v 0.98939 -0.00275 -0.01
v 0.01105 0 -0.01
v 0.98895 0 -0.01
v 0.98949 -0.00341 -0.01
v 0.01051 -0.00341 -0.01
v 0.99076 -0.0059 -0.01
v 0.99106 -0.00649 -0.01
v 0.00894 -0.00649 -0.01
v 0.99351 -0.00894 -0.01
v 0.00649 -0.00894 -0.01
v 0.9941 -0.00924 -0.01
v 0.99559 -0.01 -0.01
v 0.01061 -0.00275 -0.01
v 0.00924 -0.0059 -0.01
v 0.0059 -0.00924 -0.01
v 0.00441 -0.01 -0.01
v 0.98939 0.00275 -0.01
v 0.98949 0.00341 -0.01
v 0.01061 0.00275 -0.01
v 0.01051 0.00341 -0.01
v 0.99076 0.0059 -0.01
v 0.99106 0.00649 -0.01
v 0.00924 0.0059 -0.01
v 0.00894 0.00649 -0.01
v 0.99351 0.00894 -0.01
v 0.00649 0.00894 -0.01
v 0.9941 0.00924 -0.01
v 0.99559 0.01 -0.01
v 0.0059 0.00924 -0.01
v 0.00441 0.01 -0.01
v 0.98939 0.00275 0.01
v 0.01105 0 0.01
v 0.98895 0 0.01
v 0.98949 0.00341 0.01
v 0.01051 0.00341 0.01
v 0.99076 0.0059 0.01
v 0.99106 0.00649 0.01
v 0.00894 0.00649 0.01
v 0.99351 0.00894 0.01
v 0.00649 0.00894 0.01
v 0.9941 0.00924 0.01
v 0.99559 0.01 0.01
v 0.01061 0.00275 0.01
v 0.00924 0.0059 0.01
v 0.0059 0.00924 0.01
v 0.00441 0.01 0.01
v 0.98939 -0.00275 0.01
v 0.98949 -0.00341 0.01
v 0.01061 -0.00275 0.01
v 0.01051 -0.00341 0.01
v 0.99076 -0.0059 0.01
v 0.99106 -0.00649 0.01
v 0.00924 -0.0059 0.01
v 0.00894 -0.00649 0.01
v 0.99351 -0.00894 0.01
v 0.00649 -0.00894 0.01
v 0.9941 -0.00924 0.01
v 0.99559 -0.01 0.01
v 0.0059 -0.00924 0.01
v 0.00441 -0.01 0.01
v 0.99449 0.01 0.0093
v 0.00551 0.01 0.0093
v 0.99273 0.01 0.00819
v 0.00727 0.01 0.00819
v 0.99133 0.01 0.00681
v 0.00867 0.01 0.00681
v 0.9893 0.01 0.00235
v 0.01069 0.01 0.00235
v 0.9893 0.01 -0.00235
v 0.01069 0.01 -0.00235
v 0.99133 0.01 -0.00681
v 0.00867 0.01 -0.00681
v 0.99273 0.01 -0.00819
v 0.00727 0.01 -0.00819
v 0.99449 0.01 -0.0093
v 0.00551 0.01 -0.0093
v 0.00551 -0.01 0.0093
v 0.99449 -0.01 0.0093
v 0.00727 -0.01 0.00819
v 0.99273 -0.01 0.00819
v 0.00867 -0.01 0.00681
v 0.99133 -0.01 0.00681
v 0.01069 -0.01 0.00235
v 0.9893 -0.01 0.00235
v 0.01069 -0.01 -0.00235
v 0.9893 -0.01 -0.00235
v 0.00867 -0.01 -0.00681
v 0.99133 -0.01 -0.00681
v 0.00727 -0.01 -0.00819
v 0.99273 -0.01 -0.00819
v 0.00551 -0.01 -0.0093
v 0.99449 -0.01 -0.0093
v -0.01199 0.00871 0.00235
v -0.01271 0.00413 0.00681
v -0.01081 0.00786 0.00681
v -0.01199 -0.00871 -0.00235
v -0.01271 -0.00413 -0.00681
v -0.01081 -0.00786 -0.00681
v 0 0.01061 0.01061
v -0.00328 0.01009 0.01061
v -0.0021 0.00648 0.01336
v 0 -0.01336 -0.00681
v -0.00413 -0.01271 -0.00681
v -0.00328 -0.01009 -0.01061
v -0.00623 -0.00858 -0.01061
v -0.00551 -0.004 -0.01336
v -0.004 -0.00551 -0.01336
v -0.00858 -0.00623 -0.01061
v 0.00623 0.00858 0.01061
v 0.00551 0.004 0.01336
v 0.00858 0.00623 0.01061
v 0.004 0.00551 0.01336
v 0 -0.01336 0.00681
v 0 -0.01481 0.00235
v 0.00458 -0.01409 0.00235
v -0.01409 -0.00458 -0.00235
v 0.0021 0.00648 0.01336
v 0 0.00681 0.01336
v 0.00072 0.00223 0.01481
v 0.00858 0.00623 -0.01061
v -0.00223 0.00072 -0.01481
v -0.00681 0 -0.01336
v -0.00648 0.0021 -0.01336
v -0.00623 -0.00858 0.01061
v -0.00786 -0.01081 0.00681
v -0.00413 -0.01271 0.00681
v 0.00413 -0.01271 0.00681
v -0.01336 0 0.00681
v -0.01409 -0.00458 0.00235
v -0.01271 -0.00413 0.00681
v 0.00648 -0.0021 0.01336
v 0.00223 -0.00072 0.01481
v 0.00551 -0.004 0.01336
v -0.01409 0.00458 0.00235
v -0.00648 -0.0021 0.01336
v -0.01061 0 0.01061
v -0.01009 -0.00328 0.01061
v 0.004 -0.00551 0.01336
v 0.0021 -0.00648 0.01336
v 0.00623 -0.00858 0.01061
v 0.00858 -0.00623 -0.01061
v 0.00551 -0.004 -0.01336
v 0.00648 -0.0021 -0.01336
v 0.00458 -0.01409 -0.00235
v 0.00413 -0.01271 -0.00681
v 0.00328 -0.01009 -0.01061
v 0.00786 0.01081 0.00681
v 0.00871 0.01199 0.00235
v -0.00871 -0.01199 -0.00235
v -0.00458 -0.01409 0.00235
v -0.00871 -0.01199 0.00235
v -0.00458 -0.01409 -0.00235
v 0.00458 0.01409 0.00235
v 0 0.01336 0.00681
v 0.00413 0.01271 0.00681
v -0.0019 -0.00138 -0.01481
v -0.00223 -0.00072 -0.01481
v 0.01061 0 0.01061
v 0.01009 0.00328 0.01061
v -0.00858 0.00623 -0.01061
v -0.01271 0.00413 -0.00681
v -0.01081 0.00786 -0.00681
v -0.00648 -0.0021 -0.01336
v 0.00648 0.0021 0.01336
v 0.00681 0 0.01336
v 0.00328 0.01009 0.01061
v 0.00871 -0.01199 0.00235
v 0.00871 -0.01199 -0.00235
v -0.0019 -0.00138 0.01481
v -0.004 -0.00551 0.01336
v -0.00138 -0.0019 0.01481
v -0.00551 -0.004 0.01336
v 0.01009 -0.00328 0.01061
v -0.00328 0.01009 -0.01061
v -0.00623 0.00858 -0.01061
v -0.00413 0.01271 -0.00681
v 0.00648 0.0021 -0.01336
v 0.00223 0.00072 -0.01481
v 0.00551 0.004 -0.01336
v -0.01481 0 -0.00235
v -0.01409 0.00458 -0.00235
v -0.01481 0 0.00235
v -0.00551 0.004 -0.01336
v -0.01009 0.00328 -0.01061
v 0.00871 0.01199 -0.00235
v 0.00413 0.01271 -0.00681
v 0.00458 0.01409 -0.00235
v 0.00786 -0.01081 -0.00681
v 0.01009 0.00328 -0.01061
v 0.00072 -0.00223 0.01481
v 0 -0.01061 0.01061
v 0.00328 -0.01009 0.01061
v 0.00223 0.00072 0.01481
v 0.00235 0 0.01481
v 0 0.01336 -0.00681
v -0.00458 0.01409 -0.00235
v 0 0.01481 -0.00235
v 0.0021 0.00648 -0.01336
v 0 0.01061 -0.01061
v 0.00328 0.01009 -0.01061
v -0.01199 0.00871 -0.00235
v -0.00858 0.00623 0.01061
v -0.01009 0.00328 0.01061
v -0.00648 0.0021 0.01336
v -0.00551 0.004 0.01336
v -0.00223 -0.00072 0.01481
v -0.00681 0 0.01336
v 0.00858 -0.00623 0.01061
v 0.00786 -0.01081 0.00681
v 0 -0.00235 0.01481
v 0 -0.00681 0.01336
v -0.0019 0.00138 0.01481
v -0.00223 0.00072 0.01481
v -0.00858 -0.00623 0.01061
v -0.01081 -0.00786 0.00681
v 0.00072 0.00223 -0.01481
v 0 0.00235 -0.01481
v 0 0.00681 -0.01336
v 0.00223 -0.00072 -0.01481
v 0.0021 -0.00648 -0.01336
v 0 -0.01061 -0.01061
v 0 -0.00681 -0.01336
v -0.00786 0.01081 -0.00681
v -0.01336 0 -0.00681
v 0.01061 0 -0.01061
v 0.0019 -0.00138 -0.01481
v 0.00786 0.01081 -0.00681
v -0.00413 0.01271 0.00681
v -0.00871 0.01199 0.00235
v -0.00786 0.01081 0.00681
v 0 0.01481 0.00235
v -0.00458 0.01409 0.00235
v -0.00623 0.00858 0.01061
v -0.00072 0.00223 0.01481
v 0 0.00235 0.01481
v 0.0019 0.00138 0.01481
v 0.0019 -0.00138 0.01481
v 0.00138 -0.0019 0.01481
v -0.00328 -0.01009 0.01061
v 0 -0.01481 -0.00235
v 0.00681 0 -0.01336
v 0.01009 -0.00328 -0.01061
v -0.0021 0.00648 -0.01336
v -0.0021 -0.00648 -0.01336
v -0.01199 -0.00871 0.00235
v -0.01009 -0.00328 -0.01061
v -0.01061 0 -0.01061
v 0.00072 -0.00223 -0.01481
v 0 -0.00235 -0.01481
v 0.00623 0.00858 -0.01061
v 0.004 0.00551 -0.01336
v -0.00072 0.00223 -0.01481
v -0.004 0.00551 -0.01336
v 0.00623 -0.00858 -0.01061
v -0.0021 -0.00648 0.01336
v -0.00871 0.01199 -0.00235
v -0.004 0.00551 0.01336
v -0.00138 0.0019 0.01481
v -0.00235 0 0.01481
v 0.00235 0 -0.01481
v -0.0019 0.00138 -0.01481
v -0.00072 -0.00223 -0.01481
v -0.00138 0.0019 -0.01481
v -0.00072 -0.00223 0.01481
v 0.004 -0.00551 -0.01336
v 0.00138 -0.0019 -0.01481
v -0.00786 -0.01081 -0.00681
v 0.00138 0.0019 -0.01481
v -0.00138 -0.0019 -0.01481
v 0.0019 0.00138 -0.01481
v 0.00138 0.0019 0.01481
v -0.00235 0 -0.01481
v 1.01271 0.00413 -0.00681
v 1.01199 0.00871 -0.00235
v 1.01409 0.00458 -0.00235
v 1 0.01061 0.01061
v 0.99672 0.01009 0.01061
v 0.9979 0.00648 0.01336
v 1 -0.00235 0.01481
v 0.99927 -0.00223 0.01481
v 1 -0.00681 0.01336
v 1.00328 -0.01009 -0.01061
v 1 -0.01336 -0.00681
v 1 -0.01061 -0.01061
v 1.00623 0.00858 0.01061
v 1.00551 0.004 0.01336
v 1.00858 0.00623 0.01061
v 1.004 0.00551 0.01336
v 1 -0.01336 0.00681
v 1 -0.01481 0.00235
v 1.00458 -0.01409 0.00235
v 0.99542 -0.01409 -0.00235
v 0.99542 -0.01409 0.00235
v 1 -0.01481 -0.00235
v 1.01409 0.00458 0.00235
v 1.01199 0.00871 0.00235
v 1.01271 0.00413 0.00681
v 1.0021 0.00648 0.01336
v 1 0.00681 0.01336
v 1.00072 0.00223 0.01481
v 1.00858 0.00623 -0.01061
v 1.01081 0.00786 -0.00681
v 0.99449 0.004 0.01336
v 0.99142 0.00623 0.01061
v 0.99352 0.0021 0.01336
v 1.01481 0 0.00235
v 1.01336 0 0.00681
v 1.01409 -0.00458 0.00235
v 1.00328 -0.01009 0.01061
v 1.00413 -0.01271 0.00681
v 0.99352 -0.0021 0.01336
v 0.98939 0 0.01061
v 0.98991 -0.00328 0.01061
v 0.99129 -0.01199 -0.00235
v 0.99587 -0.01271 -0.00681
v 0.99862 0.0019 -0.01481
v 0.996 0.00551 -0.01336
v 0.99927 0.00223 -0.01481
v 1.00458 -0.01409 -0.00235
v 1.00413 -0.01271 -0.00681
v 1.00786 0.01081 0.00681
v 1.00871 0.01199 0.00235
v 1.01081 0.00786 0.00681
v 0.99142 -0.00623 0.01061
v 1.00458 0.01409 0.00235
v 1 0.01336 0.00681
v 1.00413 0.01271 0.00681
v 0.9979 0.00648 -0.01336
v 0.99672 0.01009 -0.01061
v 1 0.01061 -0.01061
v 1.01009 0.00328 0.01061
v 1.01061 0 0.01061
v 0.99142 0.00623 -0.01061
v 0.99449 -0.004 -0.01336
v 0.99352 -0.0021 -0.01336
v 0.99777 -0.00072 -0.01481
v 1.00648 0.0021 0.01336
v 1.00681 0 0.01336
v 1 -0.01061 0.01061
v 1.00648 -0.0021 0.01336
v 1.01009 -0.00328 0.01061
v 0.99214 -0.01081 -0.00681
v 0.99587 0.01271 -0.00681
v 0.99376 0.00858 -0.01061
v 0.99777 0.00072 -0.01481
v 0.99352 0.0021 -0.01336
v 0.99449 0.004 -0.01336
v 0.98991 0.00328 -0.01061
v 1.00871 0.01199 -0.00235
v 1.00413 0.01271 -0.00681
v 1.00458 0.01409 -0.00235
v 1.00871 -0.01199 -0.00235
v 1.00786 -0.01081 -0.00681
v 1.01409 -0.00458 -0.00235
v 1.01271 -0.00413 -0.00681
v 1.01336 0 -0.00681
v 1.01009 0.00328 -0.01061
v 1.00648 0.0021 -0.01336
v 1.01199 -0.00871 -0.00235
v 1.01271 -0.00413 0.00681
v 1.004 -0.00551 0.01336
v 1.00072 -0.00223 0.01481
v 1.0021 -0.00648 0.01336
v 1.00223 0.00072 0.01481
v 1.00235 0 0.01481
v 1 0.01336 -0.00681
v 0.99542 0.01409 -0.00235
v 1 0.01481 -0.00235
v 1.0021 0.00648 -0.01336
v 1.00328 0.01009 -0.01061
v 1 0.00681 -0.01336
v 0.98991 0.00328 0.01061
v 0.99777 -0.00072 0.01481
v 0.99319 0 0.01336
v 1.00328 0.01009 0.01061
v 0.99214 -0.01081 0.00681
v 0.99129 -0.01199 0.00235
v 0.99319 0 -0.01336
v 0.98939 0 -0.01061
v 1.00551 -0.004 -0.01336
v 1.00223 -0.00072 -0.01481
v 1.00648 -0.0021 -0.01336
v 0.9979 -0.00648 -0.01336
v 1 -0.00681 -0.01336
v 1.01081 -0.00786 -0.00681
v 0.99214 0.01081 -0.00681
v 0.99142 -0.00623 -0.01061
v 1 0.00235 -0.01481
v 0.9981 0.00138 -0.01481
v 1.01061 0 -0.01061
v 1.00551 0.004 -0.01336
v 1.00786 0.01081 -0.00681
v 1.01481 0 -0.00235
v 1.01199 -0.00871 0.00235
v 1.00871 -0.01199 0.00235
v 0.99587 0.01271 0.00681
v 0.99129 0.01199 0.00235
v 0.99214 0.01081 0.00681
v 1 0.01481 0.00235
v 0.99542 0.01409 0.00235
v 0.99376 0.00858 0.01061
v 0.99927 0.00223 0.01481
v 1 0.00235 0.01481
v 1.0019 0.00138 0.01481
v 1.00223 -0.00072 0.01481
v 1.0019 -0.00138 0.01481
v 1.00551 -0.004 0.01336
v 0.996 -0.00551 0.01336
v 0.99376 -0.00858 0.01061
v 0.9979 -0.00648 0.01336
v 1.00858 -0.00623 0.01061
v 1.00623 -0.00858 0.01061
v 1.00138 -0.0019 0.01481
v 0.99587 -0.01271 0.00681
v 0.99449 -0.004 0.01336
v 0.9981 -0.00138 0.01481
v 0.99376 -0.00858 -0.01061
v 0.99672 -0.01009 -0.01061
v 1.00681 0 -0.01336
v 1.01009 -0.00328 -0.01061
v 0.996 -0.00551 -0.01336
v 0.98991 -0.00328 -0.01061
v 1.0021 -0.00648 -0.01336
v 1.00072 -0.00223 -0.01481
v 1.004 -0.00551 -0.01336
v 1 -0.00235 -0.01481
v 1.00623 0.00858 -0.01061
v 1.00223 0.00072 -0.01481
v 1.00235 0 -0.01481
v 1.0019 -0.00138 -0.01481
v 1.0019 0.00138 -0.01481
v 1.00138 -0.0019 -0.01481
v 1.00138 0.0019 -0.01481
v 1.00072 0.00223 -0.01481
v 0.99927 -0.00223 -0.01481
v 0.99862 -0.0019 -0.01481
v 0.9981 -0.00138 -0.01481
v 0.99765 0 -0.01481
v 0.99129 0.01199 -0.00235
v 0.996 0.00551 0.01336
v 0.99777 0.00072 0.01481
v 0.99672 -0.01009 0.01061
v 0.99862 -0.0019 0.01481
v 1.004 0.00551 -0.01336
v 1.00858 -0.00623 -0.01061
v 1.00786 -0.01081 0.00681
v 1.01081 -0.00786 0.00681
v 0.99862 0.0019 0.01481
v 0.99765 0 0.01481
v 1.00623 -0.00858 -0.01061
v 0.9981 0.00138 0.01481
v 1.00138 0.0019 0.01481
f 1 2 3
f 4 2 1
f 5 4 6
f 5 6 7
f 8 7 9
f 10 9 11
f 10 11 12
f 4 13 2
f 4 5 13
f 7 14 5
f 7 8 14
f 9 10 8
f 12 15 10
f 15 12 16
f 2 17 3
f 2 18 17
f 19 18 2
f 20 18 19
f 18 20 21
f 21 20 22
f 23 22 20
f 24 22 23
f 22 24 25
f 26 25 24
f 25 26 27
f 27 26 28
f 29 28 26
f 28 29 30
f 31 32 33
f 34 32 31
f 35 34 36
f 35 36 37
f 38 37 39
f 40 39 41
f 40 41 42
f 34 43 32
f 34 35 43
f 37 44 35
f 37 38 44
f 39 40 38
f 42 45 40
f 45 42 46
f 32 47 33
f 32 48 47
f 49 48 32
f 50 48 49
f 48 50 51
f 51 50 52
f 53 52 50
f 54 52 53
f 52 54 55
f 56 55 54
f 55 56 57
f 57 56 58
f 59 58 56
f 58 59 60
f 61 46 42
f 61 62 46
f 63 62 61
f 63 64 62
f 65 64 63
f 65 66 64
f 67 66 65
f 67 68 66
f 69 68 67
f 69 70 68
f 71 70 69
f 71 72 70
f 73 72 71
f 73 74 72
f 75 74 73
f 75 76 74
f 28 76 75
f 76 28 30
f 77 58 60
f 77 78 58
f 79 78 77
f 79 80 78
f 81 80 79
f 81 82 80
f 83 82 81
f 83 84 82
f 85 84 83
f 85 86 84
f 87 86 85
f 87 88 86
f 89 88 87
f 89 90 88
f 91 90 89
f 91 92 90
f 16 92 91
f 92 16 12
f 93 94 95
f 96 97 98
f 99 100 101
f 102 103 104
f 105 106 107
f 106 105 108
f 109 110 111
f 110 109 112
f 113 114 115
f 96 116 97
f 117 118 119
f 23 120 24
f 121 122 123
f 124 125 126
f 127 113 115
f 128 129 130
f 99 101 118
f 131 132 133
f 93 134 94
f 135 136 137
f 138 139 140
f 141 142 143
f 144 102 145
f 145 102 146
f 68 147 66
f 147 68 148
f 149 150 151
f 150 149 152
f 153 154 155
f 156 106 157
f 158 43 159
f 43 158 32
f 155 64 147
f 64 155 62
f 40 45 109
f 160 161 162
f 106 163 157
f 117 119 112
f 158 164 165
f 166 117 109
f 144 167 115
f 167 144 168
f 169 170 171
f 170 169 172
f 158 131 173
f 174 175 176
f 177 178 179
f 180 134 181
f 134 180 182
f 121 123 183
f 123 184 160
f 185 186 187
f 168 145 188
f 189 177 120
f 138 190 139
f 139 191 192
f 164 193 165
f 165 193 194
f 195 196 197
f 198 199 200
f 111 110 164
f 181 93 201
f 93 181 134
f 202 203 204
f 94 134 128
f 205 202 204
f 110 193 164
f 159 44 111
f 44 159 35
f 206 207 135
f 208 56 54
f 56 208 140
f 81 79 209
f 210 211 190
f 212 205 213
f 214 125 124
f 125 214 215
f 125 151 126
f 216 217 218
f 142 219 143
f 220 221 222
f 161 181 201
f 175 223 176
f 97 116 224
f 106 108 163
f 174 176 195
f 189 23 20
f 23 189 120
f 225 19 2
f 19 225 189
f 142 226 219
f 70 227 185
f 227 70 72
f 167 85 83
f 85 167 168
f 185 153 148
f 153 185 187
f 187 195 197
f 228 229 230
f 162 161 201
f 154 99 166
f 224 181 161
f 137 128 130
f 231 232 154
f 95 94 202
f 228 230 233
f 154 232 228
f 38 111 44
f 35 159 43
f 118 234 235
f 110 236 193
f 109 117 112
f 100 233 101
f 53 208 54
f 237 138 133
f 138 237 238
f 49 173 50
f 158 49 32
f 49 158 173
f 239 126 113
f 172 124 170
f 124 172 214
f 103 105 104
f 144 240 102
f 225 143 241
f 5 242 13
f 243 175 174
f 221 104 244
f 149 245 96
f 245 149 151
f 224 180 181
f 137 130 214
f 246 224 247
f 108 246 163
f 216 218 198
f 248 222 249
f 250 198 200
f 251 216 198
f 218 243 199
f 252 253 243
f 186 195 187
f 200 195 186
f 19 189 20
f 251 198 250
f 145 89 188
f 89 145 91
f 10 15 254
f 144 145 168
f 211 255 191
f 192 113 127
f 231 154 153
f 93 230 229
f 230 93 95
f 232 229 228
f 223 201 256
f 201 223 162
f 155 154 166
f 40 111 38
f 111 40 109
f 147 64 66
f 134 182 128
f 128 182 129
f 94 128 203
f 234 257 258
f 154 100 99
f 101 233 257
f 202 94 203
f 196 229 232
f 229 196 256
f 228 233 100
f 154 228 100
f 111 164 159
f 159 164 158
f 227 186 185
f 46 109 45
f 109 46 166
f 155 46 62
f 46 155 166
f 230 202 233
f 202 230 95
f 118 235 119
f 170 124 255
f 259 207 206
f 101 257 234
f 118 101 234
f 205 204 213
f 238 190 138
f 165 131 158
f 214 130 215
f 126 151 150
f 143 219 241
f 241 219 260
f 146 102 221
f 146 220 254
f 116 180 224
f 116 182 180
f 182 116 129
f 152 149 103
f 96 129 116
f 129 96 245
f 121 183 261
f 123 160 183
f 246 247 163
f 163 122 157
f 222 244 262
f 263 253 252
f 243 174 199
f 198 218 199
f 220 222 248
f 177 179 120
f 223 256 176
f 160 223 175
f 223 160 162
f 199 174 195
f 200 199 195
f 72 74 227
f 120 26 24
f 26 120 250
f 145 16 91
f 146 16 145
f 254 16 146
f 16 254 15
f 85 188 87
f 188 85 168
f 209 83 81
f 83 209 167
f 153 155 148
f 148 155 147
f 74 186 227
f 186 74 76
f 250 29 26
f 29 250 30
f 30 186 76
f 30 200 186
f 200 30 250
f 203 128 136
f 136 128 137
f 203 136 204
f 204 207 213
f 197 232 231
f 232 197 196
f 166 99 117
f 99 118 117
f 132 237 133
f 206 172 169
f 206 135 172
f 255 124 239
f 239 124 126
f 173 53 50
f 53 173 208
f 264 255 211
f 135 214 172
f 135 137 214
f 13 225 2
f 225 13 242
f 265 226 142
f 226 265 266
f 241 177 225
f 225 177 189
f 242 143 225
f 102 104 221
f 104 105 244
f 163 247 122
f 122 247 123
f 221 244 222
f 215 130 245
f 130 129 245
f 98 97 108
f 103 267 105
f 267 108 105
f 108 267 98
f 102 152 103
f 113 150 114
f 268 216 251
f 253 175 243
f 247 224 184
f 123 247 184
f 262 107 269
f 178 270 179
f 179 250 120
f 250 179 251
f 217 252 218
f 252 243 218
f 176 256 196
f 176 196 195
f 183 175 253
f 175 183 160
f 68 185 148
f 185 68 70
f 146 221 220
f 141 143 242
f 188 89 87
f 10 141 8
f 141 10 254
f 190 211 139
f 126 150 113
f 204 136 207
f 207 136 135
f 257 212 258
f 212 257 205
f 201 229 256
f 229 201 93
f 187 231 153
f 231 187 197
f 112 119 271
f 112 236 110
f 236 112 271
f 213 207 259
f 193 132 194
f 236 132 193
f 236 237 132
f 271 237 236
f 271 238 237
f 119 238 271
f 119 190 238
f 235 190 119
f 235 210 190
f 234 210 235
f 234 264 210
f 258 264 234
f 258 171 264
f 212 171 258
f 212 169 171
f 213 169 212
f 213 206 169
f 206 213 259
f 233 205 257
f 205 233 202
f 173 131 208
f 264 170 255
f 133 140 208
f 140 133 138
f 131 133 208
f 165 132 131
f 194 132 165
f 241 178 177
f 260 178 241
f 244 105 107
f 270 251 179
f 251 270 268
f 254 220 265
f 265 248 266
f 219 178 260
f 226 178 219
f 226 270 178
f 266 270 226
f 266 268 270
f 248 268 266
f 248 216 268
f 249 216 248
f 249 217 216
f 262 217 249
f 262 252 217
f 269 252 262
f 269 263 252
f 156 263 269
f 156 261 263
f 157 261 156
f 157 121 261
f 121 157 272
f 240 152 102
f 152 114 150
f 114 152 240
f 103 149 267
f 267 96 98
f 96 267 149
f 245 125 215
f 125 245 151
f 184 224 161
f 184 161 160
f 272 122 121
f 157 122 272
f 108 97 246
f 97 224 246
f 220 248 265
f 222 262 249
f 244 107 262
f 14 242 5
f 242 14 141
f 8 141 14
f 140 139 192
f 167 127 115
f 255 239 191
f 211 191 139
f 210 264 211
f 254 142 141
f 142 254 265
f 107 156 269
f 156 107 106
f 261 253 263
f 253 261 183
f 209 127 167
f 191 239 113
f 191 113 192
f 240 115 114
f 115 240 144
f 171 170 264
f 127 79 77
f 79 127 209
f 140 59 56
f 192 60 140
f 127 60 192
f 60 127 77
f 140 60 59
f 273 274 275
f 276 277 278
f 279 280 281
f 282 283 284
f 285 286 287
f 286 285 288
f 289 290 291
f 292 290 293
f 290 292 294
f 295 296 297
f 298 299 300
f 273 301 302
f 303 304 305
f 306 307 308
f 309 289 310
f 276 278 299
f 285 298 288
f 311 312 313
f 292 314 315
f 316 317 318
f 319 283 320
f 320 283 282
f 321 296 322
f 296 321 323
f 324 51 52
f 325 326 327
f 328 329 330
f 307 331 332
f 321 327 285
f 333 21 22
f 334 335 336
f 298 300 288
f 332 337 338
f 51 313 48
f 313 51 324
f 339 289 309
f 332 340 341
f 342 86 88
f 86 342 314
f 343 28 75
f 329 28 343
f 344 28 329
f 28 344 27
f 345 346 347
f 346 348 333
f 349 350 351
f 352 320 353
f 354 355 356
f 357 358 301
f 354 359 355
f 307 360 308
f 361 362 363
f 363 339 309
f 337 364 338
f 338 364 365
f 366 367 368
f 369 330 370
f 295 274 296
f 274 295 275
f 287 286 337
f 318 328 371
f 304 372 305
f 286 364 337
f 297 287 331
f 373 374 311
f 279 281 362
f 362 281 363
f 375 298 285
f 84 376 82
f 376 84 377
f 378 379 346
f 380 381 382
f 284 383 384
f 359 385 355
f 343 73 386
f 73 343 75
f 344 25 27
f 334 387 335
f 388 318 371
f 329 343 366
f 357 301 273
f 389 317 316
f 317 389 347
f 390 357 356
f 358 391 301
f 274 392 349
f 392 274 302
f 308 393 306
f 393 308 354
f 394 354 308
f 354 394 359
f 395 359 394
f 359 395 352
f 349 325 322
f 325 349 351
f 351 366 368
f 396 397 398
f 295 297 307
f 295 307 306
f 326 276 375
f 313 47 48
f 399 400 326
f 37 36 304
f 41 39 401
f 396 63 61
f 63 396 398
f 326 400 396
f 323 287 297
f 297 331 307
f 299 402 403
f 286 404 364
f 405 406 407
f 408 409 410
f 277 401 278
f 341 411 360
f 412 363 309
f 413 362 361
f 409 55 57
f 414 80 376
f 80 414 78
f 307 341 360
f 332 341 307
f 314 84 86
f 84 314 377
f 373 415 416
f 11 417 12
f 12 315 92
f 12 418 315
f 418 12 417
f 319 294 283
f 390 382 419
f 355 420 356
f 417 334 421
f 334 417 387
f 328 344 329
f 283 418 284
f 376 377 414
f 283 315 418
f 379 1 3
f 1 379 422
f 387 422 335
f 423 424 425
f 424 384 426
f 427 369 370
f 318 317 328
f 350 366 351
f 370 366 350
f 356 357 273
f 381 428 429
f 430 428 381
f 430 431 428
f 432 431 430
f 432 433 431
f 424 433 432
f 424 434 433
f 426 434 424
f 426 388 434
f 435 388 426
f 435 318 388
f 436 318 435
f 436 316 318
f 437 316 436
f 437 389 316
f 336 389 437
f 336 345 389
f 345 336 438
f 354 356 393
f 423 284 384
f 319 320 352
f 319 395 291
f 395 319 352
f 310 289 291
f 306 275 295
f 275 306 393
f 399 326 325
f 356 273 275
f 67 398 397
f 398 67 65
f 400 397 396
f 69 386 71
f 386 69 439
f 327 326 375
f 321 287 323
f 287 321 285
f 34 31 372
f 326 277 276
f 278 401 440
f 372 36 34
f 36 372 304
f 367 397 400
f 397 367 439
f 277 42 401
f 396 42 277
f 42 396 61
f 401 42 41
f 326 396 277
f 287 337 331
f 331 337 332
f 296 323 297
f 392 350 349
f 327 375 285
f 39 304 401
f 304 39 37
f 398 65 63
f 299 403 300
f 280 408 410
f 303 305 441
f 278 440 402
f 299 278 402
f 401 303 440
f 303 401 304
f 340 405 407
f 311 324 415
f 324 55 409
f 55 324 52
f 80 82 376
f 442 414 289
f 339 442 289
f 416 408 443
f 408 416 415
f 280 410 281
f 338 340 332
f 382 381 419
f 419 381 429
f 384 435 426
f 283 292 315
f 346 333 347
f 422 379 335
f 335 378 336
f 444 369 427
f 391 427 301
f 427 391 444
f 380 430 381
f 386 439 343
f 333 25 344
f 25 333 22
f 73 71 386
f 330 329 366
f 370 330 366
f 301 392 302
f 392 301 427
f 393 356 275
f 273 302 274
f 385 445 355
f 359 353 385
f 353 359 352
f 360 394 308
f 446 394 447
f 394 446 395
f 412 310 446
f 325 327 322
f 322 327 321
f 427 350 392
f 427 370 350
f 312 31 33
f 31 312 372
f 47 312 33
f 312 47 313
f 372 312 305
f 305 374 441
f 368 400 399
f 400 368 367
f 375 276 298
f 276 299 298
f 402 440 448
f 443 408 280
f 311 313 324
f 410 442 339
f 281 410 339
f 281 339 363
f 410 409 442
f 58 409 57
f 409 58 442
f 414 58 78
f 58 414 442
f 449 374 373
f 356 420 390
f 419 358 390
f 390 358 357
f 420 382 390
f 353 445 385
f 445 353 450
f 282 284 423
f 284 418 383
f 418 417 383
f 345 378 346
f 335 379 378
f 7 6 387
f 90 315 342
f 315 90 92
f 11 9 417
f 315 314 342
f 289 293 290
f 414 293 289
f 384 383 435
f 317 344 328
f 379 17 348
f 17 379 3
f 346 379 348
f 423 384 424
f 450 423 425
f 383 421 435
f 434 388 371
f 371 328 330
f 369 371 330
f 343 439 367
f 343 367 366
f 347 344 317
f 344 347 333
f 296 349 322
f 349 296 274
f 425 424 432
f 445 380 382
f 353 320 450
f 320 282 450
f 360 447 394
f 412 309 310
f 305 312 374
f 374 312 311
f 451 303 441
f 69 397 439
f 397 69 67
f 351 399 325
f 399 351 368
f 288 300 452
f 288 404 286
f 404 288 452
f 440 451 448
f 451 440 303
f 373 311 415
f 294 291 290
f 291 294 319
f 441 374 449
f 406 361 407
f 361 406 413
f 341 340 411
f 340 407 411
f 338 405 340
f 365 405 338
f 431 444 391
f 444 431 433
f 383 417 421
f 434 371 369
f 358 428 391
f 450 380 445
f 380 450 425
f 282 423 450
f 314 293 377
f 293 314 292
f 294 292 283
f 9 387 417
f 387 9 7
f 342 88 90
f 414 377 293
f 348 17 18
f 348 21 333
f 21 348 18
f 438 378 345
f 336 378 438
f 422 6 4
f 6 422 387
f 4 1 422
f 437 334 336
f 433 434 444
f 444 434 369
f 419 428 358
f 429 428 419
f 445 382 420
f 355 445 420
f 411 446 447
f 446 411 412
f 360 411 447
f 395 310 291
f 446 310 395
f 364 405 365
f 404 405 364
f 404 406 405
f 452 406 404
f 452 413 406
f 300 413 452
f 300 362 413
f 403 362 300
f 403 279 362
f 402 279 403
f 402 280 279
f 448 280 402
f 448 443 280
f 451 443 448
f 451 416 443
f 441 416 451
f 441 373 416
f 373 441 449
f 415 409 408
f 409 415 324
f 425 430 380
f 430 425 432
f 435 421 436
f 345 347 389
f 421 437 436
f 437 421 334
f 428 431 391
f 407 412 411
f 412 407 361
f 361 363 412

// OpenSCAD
// Auto-generated extrusion assembly
$fn = 20;

module extrusion_2020(length)
{
  // 20mm x 20mm extrusion, colored faces
  translate([0, 0, length / 2]) difference()
  {
    cube([0.02, 0.02, length], center = true); // Hollow out slightly for visual effect
    cube([0.016, 0.016, length + 0.001], center = true);
  }
}

module colored_extrusion(start, end, white_dir)
{
  // Calculate direction and length
  dir = end -start;
  len = norm(dir); // Calculate rotation to align Z with direction
  if(len > 0.001)
  {
    translate(start) multmatrix(m = look_at(dir, white_dir)) extrusion_2020(len);
  }
}

// Look-at matrix helper
function look_at(dir, up) = let(z = dir / norm(dir), x = cross(up, z) / norm(cross(up, z)), y = cross(z, x))
  [[x[0], y[0], z[0], 0], [x[1], y[1], z[1], 0], [x[2], y[2], z[2], 0], [0, 0, 0, 1]];

module connector(pos)
{
  translate(pos) color([0.3, 0.3, 0.3]) sphere(r = 0.015);
}

// Extrusion 3
translate([0.500000, 0.000000, 0.000000]) rotate([0, 90.00, 0.00]) color([0.7, 0.7, 0.8])
  cube([0.02, 0.02, 1.000000], center = true);

connector([0.000000, 0.000000, 0.000000]);
connector([1.000000, 0.000000, 0.000000]);
